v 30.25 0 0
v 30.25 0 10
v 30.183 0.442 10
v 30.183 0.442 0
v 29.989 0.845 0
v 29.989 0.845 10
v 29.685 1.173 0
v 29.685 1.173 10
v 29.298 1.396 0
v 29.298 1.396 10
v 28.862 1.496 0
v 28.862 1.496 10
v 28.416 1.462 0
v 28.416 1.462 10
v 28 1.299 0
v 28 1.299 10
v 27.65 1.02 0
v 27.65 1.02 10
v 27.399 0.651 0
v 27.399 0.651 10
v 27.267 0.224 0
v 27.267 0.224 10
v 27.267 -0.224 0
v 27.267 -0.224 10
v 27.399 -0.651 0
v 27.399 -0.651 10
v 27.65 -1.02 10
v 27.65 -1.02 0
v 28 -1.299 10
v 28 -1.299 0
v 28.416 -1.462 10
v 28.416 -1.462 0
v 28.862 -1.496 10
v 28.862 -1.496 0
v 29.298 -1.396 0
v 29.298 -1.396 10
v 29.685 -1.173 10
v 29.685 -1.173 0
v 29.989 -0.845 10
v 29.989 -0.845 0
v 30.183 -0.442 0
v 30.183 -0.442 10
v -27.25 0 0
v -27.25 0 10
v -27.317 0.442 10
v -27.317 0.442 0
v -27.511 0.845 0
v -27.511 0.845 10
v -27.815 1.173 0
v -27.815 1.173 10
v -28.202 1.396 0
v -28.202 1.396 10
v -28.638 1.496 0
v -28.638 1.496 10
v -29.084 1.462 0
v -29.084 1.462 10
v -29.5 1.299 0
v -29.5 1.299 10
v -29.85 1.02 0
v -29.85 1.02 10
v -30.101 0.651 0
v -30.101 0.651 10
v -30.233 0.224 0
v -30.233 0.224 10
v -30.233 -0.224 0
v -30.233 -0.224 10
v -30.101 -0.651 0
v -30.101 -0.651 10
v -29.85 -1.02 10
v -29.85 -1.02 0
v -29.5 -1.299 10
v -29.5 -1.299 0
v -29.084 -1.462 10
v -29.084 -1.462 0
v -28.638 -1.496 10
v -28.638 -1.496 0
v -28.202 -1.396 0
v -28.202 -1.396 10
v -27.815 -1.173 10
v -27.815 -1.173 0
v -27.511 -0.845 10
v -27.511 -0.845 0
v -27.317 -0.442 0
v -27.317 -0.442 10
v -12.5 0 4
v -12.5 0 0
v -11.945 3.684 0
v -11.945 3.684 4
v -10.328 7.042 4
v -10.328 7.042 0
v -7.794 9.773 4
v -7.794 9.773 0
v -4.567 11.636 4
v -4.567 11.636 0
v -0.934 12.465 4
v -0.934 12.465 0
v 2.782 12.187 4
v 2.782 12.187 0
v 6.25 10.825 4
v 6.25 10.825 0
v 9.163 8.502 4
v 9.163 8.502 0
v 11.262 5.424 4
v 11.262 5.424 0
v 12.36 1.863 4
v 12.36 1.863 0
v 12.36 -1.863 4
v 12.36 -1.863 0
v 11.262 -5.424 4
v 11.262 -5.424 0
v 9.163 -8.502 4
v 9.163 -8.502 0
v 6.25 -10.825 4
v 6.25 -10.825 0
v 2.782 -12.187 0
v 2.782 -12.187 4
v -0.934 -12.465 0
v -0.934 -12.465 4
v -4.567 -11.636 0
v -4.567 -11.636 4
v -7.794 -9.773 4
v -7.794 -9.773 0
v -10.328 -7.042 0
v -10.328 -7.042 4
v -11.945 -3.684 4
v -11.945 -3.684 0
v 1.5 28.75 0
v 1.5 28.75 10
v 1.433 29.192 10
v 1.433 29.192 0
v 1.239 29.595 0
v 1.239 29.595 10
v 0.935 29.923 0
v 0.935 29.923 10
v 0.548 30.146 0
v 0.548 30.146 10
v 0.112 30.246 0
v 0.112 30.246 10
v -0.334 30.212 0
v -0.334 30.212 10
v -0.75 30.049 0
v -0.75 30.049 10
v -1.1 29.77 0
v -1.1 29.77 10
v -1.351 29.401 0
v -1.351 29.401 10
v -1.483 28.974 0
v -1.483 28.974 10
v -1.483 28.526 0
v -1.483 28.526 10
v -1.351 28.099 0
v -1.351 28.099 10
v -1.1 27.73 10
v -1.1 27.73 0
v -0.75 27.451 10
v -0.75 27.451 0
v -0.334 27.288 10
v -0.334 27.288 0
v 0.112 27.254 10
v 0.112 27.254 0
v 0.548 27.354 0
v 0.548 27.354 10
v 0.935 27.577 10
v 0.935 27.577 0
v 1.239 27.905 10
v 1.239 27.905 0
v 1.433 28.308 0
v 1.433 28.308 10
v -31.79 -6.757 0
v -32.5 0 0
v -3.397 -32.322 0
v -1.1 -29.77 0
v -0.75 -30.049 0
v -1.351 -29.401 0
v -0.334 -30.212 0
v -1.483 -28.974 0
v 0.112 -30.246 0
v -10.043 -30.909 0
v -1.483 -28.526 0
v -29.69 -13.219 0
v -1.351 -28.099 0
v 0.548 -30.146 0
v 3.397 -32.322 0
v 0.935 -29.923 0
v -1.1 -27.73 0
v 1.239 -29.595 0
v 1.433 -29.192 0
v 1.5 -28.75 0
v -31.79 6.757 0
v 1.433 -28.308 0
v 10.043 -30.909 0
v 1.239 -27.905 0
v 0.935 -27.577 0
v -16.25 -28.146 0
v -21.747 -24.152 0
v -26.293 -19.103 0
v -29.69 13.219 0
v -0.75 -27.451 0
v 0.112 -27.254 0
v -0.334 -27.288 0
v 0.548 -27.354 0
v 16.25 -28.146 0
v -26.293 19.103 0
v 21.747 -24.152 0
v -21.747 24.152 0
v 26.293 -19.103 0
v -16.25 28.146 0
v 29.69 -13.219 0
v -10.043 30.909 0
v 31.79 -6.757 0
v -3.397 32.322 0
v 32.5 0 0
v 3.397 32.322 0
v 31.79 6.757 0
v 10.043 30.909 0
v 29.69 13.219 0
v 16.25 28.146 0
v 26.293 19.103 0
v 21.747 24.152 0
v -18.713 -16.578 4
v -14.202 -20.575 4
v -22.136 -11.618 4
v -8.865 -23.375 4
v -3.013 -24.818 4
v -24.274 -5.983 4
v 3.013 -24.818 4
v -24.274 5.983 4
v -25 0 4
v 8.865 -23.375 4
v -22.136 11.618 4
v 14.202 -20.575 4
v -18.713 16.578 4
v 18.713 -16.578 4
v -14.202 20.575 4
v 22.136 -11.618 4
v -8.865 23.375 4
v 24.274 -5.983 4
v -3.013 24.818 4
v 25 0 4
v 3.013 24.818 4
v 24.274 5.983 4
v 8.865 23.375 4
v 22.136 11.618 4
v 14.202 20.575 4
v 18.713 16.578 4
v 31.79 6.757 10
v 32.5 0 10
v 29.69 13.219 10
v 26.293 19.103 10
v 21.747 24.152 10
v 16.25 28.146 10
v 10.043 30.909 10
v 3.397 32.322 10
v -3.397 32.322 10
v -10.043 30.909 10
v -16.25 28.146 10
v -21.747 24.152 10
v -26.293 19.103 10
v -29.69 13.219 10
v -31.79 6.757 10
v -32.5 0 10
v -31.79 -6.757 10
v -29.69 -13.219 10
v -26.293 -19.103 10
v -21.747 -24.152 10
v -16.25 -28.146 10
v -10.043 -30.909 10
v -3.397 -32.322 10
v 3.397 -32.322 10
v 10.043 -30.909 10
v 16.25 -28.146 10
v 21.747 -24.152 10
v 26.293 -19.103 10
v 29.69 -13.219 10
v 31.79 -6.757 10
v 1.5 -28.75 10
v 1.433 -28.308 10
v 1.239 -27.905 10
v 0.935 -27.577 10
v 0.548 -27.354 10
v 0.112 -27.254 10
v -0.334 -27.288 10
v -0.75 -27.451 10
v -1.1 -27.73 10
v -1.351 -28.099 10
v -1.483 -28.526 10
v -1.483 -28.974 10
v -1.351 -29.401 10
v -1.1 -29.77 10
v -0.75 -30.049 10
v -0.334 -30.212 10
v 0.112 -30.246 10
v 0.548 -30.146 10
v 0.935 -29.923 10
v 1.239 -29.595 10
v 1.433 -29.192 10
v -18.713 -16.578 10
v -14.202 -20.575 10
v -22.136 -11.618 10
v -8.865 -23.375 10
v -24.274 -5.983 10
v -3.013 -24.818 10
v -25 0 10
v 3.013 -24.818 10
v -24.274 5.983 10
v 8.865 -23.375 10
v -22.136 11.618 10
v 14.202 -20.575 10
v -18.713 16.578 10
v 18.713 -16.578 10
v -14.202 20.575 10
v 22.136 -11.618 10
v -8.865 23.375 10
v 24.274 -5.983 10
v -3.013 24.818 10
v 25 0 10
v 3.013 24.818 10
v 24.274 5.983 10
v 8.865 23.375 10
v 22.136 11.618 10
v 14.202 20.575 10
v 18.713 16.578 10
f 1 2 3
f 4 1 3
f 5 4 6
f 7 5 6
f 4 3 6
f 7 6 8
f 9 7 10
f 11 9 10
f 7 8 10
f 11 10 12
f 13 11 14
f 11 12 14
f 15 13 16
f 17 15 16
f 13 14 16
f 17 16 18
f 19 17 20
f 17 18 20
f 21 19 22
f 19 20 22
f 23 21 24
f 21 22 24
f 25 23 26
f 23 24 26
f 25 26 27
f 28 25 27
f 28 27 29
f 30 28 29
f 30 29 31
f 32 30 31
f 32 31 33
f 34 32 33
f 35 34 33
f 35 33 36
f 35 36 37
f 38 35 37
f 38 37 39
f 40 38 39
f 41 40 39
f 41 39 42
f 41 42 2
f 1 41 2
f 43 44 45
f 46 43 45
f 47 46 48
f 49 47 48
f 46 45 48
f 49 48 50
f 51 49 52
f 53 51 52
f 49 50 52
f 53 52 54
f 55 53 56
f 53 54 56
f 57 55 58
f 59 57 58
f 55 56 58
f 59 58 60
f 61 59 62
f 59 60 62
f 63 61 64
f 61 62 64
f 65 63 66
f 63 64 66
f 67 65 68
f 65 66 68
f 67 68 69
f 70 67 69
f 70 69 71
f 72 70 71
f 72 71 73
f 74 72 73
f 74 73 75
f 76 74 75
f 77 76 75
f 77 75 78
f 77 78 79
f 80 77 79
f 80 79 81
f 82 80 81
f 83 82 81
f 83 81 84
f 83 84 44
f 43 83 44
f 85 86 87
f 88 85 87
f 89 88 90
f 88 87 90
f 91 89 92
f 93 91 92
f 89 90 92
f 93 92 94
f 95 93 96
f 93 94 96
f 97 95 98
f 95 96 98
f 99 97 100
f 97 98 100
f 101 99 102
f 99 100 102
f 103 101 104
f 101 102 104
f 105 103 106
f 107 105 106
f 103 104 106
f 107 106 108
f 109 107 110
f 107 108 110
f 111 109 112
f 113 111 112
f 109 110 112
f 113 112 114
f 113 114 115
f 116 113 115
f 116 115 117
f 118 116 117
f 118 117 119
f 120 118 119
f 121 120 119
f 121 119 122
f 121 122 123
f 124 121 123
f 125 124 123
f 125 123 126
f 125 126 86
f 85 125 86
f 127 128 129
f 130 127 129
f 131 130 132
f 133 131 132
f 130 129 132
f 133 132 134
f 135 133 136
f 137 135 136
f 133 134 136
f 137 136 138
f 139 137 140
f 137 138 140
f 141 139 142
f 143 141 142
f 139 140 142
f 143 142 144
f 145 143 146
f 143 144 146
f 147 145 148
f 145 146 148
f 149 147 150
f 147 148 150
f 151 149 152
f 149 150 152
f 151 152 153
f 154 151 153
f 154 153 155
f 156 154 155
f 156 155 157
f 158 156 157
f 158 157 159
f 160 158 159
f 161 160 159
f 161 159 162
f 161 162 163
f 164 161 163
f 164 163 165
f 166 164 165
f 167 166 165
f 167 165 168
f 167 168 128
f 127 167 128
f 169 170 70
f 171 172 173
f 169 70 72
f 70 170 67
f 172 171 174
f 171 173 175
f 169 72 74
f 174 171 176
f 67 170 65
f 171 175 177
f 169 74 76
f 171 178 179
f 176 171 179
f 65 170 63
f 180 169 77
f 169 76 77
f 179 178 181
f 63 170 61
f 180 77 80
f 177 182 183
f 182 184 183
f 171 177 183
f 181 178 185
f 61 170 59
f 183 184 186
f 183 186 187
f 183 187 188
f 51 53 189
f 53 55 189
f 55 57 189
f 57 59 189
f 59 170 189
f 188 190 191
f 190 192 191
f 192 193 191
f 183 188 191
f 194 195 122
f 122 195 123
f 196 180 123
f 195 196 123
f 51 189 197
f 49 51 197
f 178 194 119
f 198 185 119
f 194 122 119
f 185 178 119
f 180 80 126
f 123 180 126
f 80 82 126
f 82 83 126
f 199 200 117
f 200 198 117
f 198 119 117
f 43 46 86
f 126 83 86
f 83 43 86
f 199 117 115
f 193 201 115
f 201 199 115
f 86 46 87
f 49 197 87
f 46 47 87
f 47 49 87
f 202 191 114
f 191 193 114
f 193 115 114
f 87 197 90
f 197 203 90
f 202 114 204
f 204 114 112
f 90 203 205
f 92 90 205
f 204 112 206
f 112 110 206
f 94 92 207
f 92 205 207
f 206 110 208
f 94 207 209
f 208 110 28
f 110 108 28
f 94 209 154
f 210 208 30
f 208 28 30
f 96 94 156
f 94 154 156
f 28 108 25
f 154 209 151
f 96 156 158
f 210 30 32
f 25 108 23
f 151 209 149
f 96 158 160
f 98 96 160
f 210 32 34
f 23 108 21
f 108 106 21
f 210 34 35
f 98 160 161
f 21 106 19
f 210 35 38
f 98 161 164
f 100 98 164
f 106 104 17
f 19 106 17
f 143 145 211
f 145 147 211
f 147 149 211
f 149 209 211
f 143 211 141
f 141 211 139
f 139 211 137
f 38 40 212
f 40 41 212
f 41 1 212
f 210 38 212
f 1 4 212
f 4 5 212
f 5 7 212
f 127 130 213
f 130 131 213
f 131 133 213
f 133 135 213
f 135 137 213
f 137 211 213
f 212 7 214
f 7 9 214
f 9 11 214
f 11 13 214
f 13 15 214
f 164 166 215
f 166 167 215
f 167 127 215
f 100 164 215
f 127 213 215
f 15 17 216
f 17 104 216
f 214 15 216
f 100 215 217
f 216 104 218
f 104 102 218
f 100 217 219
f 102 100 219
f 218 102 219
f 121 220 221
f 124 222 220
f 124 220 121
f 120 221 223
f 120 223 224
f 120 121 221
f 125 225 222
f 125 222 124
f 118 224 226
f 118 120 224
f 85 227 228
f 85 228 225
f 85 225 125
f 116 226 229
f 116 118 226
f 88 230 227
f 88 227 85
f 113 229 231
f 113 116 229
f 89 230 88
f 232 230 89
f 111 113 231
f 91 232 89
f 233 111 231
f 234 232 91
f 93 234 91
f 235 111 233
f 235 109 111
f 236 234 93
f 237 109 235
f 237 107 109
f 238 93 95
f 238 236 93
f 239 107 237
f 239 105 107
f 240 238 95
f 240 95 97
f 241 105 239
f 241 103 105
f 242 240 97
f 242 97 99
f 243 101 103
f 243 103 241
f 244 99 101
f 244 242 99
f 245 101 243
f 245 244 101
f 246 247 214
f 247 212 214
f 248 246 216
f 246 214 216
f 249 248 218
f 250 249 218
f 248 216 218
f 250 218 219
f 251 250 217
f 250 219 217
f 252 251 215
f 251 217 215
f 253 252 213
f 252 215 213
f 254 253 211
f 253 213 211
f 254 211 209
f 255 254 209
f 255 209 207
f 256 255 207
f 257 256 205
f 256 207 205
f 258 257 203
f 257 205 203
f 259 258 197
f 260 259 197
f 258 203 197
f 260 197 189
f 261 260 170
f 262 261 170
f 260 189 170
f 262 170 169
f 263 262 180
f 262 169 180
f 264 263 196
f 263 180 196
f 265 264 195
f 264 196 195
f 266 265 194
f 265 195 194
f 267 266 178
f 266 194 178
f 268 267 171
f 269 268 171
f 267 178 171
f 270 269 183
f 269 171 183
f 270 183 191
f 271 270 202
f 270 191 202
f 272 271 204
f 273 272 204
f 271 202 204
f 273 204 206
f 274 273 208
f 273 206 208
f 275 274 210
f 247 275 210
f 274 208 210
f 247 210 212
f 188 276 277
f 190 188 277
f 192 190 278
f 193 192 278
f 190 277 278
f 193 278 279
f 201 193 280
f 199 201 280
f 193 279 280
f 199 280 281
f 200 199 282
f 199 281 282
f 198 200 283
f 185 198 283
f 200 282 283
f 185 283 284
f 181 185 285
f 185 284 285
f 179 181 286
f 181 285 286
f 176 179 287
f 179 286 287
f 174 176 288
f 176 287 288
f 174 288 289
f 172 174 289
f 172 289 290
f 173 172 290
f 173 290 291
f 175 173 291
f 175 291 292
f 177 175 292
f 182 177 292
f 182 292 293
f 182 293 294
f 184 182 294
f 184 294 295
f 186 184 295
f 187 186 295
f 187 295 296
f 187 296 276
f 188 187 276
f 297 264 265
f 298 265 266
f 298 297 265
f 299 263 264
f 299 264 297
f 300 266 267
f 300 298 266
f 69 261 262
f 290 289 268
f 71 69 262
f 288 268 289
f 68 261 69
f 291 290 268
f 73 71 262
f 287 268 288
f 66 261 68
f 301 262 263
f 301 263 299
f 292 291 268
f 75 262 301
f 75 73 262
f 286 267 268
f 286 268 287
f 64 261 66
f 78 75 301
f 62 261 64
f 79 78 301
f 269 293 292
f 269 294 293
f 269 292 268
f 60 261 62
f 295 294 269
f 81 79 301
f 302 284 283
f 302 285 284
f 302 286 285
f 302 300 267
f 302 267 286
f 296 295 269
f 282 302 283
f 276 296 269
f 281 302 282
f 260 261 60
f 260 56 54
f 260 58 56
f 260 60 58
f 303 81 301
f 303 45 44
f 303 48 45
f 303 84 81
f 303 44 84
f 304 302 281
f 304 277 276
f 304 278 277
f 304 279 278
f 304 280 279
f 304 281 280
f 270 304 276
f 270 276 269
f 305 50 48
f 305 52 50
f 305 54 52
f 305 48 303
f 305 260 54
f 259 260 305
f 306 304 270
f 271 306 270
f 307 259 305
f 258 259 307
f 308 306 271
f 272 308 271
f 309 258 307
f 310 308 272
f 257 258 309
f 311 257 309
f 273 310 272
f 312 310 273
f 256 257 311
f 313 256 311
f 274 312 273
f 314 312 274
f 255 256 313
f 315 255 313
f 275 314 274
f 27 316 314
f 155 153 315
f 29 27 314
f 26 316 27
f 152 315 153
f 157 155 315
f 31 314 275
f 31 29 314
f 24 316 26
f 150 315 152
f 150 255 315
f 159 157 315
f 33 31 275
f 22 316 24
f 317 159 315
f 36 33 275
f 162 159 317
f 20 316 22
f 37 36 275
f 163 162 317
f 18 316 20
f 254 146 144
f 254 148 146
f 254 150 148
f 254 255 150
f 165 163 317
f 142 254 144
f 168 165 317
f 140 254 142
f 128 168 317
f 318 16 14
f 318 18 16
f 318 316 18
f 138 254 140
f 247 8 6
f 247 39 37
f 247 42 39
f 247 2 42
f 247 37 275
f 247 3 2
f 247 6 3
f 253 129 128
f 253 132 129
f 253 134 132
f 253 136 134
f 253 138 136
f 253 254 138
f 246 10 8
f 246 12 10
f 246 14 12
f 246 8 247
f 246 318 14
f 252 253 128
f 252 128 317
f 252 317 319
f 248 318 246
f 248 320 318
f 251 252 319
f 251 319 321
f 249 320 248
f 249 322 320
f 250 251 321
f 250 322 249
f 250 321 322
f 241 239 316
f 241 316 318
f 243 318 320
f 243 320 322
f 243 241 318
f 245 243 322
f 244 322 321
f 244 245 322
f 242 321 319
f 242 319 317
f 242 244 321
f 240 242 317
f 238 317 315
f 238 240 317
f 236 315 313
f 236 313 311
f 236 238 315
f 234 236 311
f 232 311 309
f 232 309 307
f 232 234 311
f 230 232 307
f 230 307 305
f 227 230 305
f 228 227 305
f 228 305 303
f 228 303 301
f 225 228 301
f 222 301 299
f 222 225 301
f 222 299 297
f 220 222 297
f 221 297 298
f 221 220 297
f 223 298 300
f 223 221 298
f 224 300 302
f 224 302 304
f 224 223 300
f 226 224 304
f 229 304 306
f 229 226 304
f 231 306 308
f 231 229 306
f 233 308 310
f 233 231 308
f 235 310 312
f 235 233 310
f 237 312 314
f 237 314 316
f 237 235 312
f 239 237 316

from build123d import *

# Parameters (mm, degrees)
ESQUISSE1_R             = 32.5
BOSS_EXTRU_1_DEPTH      = 4
ESQUISSE2_R             = 32.5
ESQUISSE2_R_2           = 25
BOSS_EXTRU_2_DEPTH      = 6
ESQUISSE3_R             = 1.5
ENL_V_MAT_EXTRU_1_DEPTH = 11
ESQUISSE4_R             = 12.5
ENL_V_MAT_EXTRU_2_DEPTH = 6


with BuildPart() as part:
    # Esquisse1 → Boss.-Extru.1 (new body)
    with BuildSketch(Plane.XY):
        Circle(ESQUISSE1_R)
    extrude(amount=BOSS_EXTRU_1_DEPTH)

    # Esquisse2 → Boss.-Extru.2 (add)
    with BuildSketch(Plane.XY.offset(4)):
        Circle(ESQUISSE2_R)
        Circle(ESQUISSE2_R_2, mode=Mode.SUBTRACT)
    extrude(amount=BOSS_EXTRU_2_DEPTH)

    # Esquisse3 → Enlèv. mat.-Extru.1 (cut, through all)
    with BuildSketch(Plane.XY.offset(10)):
        with Locations((0, 28.75)):
            Circle(ESQUISSE3_R)
        with Locations((28.75, 0)):
            Circle(ESQUISSE3_R)
        with Locations((0, -28.75)):
            Circle(ESQUISSE3_R)
        with Locations((-28.75, 0)):
            Circle(ESQUISSE3_R)
    extrude(amount=-ENL_V_MAT_EXTRU_1_DEPTH, mode=Mode.SUBTRACT)

    # Esquisse4 → Enlèv. mat.-Extru.2 (cut)
    with BuildSketch(Plane(origin=(0, 0, 0), x_dir=(-1, 0, 0), z_dir=(0, 0, -1))):
        Circle(ESQUISSE4_R)
    extrude(amount=-ENL_V_MAT_EXTRU_2_DEPTH, mode=Mode.SUBTRACT)


solid = part.part
